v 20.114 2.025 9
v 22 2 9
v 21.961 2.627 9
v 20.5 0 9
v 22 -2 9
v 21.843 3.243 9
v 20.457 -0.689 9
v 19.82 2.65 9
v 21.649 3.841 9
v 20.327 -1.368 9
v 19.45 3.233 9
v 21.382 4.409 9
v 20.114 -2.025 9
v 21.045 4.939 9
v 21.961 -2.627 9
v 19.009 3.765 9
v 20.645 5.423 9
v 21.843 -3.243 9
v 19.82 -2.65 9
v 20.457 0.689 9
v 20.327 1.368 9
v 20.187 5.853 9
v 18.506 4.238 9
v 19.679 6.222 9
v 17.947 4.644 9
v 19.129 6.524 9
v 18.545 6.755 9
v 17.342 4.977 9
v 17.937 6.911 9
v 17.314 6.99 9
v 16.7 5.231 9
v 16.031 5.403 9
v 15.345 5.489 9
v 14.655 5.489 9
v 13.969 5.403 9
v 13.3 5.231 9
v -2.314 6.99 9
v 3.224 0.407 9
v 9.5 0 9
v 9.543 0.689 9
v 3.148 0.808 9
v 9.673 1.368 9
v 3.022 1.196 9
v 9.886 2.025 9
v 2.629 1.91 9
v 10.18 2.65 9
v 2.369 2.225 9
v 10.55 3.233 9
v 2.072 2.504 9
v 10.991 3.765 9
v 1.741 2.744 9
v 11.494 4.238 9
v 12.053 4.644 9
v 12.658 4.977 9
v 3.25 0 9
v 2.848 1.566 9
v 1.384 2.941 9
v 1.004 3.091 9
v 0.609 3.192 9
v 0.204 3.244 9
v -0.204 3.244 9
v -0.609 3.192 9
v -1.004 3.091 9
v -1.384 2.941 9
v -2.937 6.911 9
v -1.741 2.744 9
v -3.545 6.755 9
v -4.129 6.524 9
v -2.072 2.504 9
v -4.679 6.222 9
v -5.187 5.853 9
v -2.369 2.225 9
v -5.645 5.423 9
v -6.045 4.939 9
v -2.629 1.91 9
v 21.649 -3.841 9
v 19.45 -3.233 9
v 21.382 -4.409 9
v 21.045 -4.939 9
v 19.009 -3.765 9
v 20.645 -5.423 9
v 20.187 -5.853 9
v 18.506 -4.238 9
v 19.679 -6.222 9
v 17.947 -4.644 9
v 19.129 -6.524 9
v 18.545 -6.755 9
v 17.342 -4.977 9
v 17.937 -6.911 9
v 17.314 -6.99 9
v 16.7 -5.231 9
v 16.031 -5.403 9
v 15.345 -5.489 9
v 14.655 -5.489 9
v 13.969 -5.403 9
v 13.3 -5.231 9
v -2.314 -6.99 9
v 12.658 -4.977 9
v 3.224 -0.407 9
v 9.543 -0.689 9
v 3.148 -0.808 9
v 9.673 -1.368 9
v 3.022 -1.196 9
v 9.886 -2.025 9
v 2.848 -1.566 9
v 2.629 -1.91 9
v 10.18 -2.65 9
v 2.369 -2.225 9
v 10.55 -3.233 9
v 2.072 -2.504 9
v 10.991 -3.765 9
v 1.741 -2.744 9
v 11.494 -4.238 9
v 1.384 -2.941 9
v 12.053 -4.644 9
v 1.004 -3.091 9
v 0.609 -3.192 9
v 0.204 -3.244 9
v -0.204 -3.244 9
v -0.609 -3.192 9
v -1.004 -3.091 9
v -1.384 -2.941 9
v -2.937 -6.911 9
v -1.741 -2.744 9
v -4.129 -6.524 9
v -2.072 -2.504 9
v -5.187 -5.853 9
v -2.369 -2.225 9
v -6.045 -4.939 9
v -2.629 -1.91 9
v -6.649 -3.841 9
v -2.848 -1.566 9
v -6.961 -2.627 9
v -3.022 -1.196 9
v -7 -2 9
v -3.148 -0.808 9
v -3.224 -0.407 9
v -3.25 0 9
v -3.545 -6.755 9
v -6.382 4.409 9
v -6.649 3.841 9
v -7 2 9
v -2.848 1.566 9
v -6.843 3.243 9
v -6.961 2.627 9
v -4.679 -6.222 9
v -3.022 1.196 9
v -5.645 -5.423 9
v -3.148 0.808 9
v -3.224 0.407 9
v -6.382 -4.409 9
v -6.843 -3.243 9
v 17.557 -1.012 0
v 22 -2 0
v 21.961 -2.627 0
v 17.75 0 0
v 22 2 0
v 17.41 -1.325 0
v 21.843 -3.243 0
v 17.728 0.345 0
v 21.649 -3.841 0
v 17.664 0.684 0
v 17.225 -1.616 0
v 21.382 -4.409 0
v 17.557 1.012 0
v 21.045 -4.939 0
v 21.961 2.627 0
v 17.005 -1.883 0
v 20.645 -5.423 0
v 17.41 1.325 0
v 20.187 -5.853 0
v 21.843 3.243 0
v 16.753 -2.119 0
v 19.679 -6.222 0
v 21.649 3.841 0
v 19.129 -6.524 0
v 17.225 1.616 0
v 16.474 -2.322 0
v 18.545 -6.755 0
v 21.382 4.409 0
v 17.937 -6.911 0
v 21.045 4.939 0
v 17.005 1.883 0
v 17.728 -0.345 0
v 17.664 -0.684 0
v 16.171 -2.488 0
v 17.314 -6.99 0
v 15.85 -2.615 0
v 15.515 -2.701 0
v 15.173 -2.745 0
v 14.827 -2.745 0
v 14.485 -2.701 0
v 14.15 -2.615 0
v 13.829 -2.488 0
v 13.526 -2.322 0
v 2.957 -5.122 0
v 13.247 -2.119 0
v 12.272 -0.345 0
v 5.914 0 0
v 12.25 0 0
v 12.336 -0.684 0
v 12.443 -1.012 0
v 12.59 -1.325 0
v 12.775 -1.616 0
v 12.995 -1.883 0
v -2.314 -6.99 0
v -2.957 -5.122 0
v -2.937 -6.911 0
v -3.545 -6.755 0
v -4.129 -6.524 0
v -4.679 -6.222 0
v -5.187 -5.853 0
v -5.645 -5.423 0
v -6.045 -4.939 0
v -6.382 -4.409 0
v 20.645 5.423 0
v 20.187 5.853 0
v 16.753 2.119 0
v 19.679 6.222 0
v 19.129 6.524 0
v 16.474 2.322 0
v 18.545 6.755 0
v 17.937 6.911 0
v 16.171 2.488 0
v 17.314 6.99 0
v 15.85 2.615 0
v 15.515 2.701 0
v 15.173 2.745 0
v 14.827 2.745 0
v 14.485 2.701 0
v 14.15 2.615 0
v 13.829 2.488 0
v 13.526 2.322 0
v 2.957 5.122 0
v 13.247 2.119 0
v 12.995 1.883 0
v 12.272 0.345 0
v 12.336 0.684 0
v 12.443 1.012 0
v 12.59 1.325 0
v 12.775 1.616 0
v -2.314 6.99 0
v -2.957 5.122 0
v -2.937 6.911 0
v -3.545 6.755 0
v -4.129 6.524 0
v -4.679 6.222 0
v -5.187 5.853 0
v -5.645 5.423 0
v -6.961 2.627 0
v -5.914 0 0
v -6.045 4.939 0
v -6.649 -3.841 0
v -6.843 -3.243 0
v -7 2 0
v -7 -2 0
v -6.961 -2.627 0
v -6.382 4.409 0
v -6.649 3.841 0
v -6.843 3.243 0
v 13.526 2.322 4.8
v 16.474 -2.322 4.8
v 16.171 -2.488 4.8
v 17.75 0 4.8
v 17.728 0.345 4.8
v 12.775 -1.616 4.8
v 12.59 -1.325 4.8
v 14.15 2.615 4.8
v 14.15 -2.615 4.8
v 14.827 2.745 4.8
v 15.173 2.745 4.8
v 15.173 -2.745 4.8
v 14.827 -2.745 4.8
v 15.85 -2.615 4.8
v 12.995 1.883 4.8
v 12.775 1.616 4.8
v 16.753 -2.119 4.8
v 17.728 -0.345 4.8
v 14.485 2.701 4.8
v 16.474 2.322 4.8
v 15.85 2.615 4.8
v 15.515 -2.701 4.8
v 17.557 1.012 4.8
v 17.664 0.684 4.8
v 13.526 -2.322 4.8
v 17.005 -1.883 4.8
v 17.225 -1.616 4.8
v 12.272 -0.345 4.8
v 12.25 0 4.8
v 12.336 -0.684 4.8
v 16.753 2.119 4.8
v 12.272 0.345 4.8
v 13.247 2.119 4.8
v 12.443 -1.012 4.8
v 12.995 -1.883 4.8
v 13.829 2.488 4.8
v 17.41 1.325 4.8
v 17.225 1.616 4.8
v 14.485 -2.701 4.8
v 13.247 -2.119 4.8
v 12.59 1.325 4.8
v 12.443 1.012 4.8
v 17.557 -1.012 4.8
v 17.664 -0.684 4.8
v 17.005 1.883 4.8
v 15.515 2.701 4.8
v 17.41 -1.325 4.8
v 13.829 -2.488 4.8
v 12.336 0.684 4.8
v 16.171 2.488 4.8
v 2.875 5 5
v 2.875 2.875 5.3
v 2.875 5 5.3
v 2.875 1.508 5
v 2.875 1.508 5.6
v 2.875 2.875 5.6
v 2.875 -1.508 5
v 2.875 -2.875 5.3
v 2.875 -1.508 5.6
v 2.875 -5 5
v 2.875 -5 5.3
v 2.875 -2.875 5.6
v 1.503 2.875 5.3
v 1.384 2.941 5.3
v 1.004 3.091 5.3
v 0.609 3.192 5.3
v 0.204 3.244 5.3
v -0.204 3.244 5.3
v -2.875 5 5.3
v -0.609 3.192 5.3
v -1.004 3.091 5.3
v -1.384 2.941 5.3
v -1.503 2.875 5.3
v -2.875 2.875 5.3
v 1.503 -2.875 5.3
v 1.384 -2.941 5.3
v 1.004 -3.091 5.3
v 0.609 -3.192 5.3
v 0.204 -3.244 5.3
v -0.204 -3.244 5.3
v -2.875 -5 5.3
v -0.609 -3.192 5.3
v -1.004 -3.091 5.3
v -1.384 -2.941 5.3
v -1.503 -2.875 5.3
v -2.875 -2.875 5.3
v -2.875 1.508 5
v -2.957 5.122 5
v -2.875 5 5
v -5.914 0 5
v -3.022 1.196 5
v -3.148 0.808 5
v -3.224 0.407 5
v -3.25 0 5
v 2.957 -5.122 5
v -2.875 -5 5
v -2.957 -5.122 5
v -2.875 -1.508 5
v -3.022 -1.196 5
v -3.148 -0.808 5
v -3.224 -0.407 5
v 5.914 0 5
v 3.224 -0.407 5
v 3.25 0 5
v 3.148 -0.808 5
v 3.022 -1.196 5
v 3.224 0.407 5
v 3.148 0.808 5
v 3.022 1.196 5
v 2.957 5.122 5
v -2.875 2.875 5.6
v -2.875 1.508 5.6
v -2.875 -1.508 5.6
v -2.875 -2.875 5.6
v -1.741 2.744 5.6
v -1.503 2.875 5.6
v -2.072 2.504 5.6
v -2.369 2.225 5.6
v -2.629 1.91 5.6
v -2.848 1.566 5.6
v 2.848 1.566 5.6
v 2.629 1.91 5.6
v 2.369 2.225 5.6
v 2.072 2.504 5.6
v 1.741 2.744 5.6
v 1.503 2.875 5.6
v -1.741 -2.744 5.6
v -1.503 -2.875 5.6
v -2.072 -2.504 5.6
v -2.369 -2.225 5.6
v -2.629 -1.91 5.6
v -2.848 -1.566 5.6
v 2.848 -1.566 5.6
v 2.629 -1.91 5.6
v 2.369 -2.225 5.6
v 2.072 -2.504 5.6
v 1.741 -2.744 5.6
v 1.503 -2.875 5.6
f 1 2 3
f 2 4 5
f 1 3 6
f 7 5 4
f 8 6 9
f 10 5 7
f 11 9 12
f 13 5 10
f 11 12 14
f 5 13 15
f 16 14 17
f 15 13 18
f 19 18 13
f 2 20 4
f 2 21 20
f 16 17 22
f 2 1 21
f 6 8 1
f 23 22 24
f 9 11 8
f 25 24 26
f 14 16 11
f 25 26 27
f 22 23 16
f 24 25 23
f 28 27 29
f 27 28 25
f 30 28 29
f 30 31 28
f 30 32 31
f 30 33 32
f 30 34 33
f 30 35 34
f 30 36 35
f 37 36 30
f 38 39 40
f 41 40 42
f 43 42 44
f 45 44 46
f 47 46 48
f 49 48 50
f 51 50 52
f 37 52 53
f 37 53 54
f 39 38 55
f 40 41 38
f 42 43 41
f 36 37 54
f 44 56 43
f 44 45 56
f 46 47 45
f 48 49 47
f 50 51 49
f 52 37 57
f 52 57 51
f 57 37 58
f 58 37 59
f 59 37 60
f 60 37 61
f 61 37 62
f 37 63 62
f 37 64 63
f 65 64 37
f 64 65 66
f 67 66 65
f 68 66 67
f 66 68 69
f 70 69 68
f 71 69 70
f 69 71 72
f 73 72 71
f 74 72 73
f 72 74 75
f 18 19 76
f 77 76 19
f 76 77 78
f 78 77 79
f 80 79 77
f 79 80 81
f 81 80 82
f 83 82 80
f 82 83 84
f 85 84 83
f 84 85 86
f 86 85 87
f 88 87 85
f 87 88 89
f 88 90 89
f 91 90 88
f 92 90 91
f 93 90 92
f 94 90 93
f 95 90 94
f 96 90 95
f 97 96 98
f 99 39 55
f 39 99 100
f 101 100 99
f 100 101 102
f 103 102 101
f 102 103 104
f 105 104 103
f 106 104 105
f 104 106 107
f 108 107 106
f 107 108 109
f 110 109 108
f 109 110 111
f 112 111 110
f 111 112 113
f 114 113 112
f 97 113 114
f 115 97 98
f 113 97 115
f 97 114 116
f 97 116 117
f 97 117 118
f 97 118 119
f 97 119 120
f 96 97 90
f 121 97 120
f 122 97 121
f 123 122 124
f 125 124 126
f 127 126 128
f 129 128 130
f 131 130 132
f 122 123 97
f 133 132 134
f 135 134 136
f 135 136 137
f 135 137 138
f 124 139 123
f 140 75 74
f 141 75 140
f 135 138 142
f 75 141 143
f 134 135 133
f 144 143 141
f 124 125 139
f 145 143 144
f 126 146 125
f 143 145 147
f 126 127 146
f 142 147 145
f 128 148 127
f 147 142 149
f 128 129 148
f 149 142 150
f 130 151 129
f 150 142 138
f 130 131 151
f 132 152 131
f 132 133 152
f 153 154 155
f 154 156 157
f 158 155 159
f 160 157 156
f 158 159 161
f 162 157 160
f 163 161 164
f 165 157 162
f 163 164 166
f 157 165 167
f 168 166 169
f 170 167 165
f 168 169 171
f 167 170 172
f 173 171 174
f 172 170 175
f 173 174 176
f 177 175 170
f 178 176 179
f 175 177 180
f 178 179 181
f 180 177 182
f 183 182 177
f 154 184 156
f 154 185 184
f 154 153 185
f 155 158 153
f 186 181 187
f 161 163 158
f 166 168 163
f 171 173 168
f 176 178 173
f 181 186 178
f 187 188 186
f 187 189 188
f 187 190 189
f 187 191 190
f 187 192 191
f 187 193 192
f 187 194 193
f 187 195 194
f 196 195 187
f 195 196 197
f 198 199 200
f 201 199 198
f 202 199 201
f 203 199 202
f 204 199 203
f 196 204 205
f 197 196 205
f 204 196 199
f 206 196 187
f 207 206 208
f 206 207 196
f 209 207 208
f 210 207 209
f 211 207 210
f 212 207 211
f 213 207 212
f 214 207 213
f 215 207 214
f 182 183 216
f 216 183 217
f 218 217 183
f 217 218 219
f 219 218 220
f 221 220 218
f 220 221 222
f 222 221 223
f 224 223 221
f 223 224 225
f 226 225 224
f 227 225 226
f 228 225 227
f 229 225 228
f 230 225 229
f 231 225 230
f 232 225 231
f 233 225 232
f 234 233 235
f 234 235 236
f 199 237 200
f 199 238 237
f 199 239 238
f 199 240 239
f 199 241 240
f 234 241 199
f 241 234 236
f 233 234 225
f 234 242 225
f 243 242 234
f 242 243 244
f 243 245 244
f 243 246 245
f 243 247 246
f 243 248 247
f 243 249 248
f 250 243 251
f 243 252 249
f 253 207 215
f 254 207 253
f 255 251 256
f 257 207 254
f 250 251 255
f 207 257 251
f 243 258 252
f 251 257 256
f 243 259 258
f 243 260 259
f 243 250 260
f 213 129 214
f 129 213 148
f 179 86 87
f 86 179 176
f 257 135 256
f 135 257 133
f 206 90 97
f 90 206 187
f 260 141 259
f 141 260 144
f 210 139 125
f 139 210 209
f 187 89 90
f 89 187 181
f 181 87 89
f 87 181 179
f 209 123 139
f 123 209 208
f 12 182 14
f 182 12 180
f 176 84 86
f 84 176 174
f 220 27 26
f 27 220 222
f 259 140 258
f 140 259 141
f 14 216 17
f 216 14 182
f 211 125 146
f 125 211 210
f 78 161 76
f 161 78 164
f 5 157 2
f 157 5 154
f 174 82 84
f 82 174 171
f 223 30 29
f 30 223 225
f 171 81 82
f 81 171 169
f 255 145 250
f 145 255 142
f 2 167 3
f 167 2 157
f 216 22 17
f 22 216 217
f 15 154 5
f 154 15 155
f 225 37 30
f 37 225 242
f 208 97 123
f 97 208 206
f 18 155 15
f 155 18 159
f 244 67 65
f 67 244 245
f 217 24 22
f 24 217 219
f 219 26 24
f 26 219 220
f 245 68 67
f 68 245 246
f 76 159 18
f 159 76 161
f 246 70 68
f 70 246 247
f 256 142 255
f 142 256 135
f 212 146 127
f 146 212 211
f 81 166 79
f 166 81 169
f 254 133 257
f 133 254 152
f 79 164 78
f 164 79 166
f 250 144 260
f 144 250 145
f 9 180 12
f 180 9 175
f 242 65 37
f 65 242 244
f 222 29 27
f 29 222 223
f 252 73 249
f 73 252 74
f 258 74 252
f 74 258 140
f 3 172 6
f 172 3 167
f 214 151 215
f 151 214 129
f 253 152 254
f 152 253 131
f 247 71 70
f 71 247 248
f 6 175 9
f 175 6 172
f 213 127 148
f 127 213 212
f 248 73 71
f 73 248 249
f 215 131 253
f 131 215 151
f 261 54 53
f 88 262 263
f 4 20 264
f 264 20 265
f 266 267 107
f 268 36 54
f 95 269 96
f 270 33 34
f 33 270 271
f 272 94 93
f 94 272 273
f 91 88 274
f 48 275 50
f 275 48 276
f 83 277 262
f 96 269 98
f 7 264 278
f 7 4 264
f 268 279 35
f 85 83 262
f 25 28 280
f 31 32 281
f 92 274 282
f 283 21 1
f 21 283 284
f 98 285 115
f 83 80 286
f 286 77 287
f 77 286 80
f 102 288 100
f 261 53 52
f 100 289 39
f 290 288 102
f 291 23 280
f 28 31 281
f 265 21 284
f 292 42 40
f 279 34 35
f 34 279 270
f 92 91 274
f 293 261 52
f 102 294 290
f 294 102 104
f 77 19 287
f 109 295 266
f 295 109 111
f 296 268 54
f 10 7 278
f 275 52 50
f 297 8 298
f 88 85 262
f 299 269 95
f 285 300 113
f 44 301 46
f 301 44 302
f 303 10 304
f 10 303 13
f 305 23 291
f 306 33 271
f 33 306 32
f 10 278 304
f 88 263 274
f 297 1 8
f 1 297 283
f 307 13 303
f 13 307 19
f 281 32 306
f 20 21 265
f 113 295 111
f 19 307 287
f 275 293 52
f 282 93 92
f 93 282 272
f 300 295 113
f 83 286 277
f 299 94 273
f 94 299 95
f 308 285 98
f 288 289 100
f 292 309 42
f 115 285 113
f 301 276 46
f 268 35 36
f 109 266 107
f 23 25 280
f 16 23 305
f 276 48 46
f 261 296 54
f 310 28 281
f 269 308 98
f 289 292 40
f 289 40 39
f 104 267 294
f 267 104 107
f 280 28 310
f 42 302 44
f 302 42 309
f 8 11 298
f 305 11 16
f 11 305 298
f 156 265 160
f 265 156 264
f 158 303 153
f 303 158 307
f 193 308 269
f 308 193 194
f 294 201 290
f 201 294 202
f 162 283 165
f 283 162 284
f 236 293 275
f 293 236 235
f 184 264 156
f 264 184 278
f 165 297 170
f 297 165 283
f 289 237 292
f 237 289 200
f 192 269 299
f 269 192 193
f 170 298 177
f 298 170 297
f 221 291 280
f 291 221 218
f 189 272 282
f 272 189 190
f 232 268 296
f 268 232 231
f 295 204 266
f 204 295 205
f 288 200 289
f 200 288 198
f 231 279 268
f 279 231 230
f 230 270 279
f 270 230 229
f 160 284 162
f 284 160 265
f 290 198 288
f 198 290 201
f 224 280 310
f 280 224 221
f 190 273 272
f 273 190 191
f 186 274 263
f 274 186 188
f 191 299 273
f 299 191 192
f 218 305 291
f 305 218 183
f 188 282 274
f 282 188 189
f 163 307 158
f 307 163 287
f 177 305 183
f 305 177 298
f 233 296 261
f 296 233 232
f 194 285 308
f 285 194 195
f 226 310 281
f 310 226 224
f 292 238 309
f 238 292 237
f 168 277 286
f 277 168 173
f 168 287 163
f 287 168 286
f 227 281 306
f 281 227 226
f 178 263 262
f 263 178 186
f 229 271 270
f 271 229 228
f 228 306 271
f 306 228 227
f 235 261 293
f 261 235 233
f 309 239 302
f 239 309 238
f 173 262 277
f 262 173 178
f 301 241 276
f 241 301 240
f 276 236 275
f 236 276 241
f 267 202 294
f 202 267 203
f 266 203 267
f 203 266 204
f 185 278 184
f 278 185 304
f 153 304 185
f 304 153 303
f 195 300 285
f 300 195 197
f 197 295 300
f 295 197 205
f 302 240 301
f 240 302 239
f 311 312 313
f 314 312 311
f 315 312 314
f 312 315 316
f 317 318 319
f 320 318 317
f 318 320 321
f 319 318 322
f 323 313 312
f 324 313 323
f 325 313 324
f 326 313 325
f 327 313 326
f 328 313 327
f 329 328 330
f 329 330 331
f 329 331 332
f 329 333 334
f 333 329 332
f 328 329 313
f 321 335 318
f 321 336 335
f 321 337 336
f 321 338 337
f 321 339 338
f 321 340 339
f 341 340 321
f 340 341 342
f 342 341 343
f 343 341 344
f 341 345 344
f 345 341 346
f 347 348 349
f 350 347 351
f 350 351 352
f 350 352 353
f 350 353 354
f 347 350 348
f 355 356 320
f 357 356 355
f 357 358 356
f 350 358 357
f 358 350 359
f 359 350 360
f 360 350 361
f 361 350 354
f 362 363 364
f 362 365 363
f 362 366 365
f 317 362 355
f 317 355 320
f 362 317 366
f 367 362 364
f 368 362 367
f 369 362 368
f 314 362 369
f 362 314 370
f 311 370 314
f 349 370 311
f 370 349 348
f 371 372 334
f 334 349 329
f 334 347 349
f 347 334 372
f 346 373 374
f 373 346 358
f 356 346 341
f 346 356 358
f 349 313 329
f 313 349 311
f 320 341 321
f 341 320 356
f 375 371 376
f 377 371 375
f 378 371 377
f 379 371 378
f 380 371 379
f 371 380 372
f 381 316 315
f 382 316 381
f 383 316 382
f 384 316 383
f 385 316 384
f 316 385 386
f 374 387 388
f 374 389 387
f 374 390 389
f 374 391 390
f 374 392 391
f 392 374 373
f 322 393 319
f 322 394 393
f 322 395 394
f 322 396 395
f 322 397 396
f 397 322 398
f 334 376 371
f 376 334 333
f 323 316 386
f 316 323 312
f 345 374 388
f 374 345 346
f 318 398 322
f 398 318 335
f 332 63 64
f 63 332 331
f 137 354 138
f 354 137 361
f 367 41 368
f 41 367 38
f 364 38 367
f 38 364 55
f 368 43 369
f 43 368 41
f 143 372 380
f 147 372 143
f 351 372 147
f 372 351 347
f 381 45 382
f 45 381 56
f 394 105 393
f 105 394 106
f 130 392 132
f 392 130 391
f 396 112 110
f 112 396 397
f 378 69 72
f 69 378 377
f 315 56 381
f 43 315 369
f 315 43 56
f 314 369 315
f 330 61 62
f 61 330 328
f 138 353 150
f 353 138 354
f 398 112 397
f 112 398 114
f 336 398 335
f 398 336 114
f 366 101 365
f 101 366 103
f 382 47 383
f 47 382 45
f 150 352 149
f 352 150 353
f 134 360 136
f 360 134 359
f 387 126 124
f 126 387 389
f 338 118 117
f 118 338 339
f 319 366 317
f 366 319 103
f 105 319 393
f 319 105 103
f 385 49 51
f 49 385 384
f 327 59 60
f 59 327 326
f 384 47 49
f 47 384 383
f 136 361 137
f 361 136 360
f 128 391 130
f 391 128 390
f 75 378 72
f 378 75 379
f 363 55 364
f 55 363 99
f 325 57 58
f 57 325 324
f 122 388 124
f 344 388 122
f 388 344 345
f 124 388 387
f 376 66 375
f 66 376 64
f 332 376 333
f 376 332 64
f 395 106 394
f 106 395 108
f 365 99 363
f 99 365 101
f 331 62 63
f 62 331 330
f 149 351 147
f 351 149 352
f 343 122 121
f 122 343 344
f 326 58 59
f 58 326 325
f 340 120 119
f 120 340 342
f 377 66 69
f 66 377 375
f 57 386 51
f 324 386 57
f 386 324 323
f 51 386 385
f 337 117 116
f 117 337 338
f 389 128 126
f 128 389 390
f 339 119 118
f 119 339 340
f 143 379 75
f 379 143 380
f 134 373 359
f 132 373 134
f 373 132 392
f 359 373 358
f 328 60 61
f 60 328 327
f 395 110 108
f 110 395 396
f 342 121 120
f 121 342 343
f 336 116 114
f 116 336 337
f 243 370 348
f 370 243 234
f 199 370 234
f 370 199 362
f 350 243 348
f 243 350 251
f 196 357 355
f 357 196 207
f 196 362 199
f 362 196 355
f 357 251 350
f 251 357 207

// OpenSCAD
$fn = 50;


difference() {
	union() {
		cylinder(h = 9, r = 7.0000000000);
		translate(v = [7.5000000000, 0.0000000000, 0]) {
			hull() {
				translate(v = [-9.5000000000, 2.0000000000, 0]) {
					cylinder(h = 9, r = 5);
				}
				translate(v = [9.5000000000, 2.0000000000, 0]) {
					cylinder(h = 9, r = 5);
				}
				translate(v = [-9.5000000000, -2.0000000000, 0]) {
					cylinder(h = 9, r = 5);
				}
				translate(v = [9.5000000000, -2.0000000000, 0]) {
					cylinder(h = 9, r = 5);
				}
			}
		}
		translate(v = [7.5000000000, 0.0000000000, 0]) {
			hull() {
				translate(v = [-9.5000000000, 2.0000000000, 0]) {
					cylinder(h = 9, r = 5);
				}
				translate(v = [9.5000000000, 2.0000000000, 0]) {
					cylinder(h = 9, r = 5);
				}
				translate(v = [-9.5000000000, -2.0000000000, 0]) {
					cylinder(h = 9, r = 5);
				}
				translate(v = [9.5000000000, -2.0000000000, 0]) {
					cylinder(h = 9, r = 5);
				}
			}
		}
	}
	union() {
		translate(v = [15.0000000000, 0.0000000000, 9]) {
			rotate(a = [0, 0, 0]) {
				difference() {
					union() {
						#translate(v = [0, 0, -9.0000000000]) {
							cylinder(h = 9, r = 2.2500000000);
						}
						#translate(v = [0, 0, -4.2000000000]) {
							cylinder(h = 4.2000000000, r1 = 2.7500000000, r2 = 5.5000000000);
						}
						#translate(v = [0, 0, -9.0000000000]) {
							cylinder(h = 9, r = 2.7500000000);
						}
						#translate(v = [0, 0, -9.0000000000]) {
							cylinder(h = 9, r = 2.2500000000);
						}
					}
					union();
				}
			}
		}
		translate(v = [15.0000000000, 0.0000000000, 9]) {
			rotate(a = [0, 0, 0]) {
				difference() {
					union() {
						#translate(v = [0, 0, -9.0000000000]) {
							cylinder(h = 9, r = 2.2500000000);
						}
						#translate(v = [0, 0, -4.2000000000]) {
							cylinder(h = 4.2000000000, r1 = 2.7500000000, r2 = 5.5000000000);
						}
						#translate(v = [0, 0, -9.0000000000]) {
							cylinder(h = 9, r = 2.7500000000);
						}
						#translate(v = [0, 0, -9.0000000000]) {
							cylinder(h = 9, r = 2.2500000000);
						}
					}
					union();
				}
			}
		}
		translate(v = [0.0000000000, 0.0000000000, 0]) {
			rotate(a = [0, 0, 0]) {
				difference() {
					union() {
						#translate(v = [-2.8750000000, -5.0000000000, -0.3000000000]) {
							cube(size = [5.7500000000, 10, 0.3000000000]);
						}
						#translate(v = [-2.8750000000, -2.8750000000, -0.6000000000]) {
							cube(size = [5.7500000000, 5.7500000000, 0.3000000000]);
						}
						#translate(v = [-2.8750000000, -5.0000000000, 5]) {
							cube(size = [5.7500000000, 10, 0.3000000000]);
						}
						#translate(v = [-2.8750000000, -2.8750000000, 5.3000000000]) {
							cube(size = [5.7500000000, 5.7500000000, 0.3000000000]);
						}
						#translate(v = [0, 0, -100.0000000000]) {
							cylinder(h = 200, r = 3.2500000000);
						}
						#linear_extrude(height = 5) {
							polygon(points = [[5.9142500000, 0.0000000000], [2.9571250000, 5.1218907443], [-2.9571250000, 5.1218907443], [-5.9142500000, 0.0000000000], [-2.9571250000, -5.1218907443], [2.9571250000, -5.1218907443]]);
						}
						#translate(v = [-2.8750000000, -5.0000000000, -0.3000000000]) {
							cube(size = [5.7500000000, 10, 0.3000000000]);
						}
						#translate(v = [-2.8750000000, -2.8750000000, -0.6000000000]) {
							cube(size = [5.7500000000, 5.7500000000, 0.3000000000]);
						}
						#translate(v = [-2.8750000000, -5.0000000000, 5]) {
							cube(size = [5.7500000000, 10, 0.3000000000]);
						}
						#translate(v = [-2.8750000000, -2.8750000000, 5.3000000000]) {
							cube(size = [5.7500000000, 5.7500000000, 0.3000000000]);
						}
						#translate(v = [0, 0, -100.0000000000]) {
							cylinder(h = 200, r = 3.2500000000);
						}
						#translate(v = [-2.8750000000, -5.0000000000, -0.3000000000]) {
							cube(size = [5.7500000000, 10, 0.3000000000]);
						}
						#translate(v = [-2.8750000000, -2.8750000000, -0.6000000000]) {
							cube(size = [5.7500000000, 5.7500000000, 0.3000000000]);
						}
						#translate(v = [-2.8750000000, -5.0000000000, 5]) {
							cube(size = [5.7500000000, 10, 0.3000000000]);
						}
						#translate(v = [-2.8750000000, -2.8750000000, 5.3000000000]) {
							cube(size = [5.7500000000, 5.7500000000, 0.3000000000]);
						}
						#translate(v = [0, 0, -100.0000000000]) {
							cylinder(h = 200, r = 3.2500000000);
						}
					}
					union();
				}
			}
		}
		translate(v = [0, 0, -100]) {
			cylinder(h = 200, r = 3.2500000000);
		}
		translate(v = [0, 0, -100]) {
			cylinder(h = 200, r = 1.8000000000);
		}
	}
}
